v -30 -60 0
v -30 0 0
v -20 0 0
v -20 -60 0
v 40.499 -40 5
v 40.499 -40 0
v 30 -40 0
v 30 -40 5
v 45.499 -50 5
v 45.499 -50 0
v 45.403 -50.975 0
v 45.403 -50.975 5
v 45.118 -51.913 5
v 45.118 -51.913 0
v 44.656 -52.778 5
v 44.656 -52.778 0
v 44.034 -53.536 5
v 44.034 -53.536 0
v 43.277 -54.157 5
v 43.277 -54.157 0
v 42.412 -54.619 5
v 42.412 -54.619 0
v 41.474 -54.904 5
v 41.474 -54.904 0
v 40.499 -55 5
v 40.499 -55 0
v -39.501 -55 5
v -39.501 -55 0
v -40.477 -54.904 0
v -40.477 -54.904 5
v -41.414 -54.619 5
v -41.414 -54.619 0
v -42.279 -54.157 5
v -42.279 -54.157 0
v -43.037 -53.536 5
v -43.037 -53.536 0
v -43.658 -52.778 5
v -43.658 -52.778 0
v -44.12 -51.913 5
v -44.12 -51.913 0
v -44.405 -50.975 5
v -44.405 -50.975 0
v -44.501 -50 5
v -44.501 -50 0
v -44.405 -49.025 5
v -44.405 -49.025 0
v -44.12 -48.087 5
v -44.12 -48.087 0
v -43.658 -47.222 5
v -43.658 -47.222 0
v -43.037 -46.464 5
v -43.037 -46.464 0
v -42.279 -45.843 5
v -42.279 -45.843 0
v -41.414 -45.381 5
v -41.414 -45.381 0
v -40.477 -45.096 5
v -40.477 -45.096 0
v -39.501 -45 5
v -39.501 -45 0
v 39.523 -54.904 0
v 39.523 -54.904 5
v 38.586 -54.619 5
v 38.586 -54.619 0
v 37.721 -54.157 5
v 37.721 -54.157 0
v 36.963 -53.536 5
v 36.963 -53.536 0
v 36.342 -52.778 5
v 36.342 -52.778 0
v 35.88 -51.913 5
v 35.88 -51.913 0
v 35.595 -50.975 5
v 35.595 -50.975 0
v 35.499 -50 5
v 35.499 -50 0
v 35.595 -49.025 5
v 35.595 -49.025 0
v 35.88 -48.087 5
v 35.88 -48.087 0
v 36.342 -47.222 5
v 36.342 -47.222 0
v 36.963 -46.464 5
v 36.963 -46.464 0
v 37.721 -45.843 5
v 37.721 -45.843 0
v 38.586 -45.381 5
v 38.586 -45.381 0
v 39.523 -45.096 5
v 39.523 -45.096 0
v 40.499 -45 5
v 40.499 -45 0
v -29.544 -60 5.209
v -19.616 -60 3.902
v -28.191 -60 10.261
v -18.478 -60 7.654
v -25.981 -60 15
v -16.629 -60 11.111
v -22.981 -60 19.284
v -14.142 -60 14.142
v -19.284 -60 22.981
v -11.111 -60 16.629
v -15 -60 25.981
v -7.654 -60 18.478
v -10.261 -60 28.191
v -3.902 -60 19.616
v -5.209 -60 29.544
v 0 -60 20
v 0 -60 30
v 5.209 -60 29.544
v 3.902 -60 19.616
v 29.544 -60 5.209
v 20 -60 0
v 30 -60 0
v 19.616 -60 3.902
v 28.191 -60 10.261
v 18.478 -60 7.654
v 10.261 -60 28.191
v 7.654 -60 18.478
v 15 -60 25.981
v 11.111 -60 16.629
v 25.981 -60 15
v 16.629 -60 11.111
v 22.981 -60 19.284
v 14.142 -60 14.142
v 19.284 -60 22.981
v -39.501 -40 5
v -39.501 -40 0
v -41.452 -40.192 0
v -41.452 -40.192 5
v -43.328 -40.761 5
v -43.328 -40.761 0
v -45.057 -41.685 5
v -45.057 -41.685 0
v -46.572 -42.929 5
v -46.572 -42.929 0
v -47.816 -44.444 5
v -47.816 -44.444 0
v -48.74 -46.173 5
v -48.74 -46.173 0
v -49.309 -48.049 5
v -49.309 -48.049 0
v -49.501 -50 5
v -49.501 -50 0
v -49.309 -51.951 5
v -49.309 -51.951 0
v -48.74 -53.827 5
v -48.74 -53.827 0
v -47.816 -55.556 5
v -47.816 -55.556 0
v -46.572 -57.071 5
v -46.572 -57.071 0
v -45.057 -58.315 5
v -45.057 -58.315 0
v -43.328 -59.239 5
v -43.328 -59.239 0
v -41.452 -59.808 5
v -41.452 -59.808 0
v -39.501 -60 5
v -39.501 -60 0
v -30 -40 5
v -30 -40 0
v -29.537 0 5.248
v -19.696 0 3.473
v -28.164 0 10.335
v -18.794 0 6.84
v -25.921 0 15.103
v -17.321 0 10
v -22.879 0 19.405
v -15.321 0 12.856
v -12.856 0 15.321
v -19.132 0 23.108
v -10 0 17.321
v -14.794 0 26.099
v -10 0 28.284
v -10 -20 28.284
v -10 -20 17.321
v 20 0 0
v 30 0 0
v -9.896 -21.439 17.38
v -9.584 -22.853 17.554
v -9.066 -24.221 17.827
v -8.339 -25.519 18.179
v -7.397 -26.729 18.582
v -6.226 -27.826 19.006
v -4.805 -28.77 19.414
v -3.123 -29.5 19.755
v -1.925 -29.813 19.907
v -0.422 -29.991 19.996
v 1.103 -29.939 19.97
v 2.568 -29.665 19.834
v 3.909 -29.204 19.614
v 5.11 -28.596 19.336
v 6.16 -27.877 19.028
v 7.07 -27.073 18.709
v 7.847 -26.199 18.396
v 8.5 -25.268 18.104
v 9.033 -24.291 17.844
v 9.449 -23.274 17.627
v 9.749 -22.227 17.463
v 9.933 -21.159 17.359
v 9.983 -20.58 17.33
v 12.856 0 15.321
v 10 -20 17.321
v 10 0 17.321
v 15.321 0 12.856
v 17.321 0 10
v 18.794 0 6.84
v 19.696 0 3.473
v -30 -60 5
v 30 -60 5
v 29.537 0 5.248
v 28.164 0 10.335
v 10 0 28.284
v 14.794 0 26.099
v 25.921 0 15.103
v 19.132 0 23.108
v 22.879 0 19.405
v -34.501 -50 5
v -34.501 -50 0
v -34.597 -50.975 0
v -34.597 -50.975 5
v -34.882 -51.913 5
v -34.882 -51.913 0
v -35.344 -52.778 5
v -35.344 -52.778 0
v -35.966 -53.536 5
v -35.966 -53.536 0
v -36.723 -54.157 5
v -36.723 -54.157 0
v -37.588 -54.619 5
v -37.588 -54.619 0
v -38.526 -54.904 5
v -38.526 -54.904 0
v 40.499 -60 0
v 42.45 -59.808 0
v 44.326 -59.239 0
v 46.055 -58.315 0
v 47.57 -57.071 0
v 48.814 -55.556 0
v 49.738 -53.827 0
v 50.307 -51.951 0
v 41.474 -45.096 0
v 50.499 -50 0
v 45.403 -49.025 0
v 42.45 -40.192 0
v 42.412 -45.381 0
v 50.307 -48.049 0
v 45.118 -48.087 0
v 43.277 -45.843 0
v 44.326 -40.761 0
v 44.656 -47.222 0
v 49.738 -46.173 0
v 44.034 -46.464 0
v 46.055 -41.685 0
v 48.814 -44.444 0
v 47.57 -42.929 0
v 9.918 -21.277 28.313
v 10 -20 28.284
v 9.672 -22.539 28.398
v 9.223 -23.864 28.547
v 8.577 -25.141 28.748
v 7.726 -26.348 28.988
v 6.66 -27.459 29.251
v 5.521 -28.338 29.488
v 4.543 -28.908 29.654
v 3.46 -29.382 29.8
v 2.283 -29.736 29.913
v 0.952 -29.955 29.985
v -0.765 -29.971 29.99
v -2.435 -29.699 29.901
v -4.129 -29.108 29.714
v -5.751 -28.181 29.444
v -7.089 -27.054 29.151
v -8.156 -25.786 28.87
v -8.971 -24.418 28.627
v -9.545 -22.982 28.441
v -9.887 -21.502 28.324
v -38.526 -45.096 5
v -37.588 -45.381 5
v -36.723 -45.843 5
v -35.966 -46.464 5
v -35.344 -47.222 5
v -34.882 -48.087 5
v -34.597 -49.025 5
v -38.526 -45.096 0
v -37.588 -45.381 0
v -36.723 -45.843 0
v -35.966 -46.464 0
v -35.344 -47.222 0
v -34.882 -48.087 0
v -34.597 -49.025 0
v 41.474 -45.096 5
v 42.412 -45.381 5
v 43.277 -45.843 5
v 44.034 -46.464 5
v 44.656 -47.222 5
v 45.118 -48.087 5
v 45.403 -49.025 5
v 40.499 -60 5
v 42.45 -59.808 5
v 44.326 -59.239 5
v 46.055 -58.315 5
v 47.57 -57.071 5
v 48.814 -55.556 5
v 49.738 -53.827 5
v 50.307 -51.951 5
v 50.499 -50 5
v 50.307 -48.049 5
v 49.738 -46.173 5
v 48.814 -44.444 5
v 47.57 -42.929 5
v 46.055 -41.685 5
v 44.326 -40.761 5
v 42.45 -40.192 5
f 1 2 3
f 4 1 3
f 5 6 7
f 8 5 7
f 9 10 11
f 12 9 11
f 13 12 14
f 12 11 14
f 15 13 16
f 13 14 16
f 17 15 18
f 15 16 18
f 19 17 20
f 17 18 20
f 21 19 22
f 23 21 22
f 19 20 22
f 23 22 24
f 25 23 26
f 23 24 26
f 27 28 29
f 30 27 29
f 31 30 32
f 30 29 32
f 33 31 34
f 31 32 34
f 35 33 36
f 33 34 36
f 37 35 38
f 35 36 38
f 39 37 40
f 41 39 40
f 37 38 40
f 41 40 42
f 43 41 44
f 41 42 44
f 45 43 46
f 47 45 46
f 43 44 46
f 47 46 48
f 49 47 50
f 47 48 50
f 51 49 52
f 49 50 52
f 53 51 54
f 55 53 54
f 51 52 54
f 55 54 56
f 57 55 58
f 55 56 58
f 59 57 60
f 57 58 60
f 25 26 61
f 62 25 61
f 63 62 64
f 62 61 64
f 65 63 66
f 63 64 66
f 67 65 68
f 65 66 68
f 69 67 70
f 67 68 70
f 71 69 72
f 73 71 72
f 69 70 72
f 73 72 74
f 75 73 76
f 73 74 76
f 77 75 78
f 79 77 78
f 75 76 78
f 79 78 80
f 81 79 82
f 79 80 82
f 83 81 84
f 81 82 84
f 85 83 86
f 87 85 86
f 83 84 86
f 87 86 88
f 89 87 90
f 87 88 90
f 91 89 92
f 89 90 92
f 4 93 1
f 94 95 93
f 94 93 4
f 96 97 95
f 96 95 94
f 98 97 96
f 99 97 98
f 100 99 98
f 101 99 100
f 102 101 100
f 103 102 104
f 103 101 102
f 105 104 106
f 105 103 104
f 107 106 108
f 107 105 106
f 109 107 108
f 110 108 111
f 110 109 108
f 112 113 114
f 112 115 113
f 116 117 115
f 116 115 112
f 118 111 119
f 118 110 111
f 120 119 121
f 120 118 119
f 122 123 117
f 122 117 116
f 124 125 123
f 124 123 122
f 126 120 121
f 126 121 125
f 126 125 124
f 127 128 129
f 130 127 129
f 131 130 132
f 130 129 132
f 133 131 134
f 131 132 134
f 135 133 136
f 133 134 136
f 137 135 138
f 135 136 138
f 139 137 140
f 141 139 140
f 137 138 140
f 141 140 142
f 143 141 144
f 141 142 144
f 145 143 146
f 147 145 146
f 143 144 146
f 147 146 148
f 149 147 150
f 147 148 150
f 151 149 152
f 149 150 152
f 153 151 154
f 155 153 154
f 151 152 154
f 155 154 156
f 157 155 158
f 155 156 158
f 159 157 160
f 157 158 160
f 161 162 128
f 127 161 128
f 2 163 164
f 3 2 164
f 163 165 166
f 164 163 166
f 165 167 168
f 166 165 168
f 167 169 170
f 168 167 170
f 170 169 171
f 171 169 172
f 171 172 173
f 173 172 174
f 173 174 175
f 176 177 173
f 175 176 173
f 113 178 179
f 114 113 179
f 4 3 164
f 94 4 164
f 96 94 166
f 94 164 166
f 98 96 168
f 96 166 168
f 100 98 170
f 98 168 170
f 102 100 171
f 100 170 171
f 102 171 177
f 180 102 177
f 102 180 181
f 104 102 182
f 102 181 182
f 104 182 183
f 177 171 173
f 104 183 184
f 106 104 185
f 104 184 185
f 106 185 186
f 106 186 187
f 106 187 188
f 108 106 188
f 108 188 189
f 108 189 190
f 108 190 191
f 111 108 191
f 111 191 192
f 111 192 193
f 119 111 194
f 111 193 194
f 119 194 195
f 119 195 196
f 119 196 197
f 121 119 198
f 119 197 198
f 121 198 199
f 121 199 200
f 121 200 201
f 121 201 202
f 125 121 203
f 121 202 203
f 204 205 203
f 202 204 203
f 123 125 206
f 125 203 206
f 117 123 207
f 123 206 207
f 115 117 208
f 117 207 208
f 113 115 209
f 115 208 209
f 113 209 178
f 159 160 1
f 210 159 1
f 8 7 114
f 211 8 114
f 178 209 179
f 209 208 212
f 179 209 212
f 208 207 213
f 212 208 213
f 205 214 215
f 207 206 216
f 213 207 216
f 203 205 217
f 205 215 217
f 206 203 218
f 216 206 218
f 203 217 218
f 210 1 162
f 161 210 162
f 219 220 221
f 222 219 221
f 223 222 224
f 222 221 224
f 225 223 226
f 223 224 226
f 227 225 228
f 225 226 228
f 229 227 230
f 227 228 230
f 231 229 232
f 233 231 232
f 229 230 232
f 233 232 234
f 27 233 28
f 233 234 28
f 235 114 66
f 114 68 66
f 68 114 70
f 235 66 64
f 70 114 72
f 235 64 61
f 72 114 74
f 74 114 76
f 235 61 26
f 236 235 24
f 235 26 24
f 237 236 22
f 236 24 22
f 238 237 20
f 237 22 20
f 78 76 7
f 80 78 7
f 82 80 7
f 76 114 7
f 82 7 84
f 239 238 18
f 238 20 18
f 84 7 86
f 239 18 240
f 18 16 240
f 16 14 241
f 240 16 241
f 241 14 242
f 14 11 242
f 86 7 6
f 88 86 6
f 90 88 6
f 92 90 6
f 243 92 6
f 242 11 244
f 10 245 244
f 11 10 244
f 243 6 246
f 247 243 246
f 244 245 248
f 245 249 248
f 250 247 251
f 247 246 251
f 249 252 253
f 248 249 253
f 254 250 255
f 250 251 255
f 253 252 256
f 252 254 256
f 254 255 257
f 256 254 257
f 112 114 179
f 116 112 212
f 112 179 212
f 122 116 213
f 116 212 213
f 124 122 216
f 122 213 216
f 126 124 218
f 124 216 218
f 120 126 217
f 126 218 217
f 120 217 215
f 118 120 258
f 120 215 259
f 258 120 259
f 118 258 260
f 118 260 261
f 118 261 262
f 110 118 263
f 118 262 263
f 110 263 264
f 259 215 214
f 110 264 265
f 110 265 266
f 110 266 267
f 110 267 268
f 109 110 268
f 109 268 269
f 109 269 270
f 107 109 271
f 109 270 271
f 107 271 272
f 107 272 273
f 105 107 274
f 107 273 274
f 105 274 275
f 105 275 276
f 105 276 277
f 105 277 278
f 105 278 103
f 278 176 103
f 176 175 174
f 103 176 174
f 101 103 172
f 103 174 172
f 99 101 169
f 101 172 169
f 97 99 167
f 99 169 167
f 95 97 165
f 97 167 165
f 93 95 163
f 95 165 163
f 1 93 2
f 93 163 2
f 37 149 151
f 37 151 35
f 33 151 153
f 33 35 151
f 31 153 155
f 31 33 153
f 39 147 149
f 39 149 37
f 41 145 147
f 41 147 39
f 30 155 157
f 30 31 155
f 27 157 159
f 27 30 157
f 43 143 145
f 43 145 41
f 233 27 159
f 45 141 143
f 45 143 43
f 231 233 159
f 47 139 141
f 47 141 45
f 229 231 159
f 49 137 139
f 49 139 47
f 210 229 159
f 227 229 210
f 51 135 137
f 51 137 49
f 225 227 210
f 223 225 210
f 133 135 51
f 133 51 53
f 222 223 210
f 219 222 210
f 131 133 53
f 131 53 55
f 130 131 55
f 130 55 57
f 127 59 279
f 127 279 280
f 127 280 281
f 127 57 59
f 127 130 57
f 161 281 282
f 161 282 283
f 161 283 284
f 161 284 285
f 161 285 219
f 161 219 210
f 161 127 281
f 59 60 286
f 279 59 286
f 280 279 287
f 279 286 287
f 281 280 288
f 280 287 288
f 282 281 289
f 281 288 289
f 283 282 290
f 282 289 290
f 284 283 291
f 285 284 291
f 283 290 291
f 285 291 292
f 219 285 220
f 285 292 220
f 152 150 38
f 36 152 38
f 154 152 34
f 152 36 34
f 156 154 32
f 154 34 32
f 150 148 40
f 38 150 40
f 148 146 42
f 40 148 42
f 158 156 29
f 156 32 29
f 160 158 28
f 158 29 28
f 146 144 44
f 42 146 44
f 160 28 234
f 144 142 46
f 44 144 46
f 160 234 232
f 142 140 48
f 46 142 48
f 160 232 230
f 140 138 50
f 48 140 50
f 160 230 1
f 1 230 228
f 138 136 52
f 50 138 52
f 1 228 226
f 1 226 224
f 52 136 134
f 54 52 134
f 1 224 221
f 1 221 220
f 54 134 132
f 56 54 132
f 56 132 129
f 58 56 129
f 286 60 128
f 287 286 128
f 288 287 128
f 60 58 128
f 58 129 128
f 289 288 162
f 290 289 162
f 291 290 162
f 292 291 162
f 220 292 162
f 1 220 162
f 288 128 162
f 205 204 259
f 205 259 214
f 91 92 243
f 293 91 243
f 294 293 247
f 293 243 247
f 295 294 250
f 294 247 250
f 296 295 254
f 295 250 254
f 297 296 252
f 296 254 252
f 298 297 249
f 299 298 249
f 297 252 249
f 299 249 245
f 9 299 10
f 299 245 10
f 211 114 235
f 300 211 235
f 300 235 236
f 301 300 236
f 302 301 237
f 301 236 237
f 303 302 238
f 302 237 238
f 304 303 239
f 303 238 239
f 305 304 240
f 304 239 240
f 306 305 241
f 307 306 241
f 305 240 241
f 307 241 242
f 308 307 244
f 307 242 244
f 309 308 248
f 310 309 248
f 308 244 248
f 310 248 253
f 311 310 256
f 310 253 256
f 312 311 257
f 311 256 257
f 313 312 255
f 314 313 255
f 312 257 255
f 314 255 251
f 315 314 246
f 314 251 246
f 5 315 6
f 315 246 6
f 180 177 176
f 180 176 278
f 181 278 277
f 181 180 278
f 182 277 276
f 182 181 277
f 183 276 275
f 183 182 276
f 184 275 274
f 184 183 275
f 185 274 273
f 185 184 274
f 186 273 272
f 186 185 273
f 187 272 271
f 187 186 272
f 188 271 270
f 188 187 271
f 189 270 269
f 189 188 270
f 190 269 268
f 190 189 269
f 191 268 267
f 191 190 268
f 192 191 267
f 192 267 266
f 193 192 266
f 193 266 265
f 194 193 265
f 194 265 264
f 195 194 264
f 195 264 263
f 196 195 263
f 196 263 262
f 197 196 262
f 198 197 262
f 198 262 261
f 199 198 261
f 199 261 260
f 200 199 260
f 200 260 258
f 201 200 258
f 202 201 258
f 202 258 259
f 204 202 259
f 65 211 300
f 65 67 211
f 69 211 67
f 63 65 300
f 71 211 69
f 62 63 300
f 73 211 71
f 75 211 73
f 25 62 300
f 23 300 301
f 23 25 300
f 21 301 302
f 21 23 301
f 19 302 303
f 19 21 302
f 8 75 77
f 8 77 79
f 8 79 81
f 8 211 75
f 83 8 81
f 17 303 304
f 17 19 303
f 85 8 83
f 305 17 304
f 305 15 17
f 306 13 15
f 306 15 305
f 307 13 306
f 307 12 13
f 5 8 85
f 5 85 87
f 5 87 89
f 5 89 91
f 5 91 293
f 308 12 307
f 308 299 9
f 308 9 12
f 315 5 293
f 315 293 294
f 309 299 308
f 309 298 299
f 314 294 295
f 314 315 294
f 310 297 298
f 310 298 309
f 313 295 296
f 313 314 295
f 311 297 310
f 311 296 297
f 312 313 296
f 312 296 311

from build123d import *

# Parameters (mm, degrees)
F1_DEPTH = 60
F2_W     = 20
F2_H     = 40
F3_DEPTH = 30.001
F5_DEPTH = 5


with BuildPart() as f1:
    # F0 (on Front) → F1 (new body)
    with BuildSketch(Plane.XZ):
        with BuildLine():
            Line((20, 0), (30, 0))
            ThreePointArc((30, 0), (0, 30), (-30, 0))
            Line((-30, 0), (-20, 0))
            ThreePointArc((-20, 0), (0, 20), (20, 0))
        make_face()
    extrude(amount=F1_DEPTH)

    # F2 (on Top) → F3 (cut, through all)
    with BuildSketch(Plane.XY):
        Rectangle(F2_W, F2_H)
        with BuildLine():
            Line((10, -20), (-10, -20))
            ThreePointArc((-10, -20), (0, -30), (10, -20))
        make_face()
    extrude(amount=F3_DEPTH, mode=Mode.SUBTRACT)


with BuildPart() as f5:
    # F4 (on Top) → F5 (new body)
    with BuildSketch(Plane.XY):
        with BuildLine():
            Line((-30, -40), (-39.501077, -40))
            Line((-39.501077, -40), (-39.501077, -45))
            ThreePointArc((-39.501077, -45), (-35.965543, -46.464466), (-34.501077, -50))
            ThreePointArc((-34.501077, -50), (-35.965543, -53.535534), (-39.501077, -55))
            Line((-39.501077, -55), (-39.501077, -60))
            Line((-39.501077, -60), (-30, -60))
            Line((-30, -60), (-30, -40))
        make_face()
        with BuildLine():
            Line((-39.501077, -45), (-39.501077, -40))
            ThreePointArc((-39.501077, -40), (-49.501077, -50), (-39.501077, -60))
            Line((-39.501077, -60), (-39.501077, -55))
            ThreePointArc((-39.501077, -55), (-44.501077, -50), (-39.501077, -45))
        make_face()
        with BuildLine():
            Line((40.498923, -45), (40.498923, -40))
            Line((40.498923, -40), (30, -40))
            Line((30, -40), (30, -60))
            Line((30, -60), (40.498923, -60))
            Line((40.498923, -60), (40.498923, -55))
            ThreePointArc((40.498923, -55), (35.498923, -50), (40.498923, -45))
        make_face()
        with BuildLine():
            ThreePointArc((40.498923, -60), (50.498923, -50), (40.498923, -40))
            Line((40.498923, -40), (40.498923, -45))
            ThreePointArc((40.498923, -45), (44.034457, -46.464466), (45.498923, -50))
            ThreePointArc((45.498923, -50), (44.034457, -53.535534), (40.498923, -55))
            Line((40.498923, -55), (40.498923, -60))
        make_face()
    extrude(amount=F5_DEPTH)


solid = Compound([f1.part, f5.part])
